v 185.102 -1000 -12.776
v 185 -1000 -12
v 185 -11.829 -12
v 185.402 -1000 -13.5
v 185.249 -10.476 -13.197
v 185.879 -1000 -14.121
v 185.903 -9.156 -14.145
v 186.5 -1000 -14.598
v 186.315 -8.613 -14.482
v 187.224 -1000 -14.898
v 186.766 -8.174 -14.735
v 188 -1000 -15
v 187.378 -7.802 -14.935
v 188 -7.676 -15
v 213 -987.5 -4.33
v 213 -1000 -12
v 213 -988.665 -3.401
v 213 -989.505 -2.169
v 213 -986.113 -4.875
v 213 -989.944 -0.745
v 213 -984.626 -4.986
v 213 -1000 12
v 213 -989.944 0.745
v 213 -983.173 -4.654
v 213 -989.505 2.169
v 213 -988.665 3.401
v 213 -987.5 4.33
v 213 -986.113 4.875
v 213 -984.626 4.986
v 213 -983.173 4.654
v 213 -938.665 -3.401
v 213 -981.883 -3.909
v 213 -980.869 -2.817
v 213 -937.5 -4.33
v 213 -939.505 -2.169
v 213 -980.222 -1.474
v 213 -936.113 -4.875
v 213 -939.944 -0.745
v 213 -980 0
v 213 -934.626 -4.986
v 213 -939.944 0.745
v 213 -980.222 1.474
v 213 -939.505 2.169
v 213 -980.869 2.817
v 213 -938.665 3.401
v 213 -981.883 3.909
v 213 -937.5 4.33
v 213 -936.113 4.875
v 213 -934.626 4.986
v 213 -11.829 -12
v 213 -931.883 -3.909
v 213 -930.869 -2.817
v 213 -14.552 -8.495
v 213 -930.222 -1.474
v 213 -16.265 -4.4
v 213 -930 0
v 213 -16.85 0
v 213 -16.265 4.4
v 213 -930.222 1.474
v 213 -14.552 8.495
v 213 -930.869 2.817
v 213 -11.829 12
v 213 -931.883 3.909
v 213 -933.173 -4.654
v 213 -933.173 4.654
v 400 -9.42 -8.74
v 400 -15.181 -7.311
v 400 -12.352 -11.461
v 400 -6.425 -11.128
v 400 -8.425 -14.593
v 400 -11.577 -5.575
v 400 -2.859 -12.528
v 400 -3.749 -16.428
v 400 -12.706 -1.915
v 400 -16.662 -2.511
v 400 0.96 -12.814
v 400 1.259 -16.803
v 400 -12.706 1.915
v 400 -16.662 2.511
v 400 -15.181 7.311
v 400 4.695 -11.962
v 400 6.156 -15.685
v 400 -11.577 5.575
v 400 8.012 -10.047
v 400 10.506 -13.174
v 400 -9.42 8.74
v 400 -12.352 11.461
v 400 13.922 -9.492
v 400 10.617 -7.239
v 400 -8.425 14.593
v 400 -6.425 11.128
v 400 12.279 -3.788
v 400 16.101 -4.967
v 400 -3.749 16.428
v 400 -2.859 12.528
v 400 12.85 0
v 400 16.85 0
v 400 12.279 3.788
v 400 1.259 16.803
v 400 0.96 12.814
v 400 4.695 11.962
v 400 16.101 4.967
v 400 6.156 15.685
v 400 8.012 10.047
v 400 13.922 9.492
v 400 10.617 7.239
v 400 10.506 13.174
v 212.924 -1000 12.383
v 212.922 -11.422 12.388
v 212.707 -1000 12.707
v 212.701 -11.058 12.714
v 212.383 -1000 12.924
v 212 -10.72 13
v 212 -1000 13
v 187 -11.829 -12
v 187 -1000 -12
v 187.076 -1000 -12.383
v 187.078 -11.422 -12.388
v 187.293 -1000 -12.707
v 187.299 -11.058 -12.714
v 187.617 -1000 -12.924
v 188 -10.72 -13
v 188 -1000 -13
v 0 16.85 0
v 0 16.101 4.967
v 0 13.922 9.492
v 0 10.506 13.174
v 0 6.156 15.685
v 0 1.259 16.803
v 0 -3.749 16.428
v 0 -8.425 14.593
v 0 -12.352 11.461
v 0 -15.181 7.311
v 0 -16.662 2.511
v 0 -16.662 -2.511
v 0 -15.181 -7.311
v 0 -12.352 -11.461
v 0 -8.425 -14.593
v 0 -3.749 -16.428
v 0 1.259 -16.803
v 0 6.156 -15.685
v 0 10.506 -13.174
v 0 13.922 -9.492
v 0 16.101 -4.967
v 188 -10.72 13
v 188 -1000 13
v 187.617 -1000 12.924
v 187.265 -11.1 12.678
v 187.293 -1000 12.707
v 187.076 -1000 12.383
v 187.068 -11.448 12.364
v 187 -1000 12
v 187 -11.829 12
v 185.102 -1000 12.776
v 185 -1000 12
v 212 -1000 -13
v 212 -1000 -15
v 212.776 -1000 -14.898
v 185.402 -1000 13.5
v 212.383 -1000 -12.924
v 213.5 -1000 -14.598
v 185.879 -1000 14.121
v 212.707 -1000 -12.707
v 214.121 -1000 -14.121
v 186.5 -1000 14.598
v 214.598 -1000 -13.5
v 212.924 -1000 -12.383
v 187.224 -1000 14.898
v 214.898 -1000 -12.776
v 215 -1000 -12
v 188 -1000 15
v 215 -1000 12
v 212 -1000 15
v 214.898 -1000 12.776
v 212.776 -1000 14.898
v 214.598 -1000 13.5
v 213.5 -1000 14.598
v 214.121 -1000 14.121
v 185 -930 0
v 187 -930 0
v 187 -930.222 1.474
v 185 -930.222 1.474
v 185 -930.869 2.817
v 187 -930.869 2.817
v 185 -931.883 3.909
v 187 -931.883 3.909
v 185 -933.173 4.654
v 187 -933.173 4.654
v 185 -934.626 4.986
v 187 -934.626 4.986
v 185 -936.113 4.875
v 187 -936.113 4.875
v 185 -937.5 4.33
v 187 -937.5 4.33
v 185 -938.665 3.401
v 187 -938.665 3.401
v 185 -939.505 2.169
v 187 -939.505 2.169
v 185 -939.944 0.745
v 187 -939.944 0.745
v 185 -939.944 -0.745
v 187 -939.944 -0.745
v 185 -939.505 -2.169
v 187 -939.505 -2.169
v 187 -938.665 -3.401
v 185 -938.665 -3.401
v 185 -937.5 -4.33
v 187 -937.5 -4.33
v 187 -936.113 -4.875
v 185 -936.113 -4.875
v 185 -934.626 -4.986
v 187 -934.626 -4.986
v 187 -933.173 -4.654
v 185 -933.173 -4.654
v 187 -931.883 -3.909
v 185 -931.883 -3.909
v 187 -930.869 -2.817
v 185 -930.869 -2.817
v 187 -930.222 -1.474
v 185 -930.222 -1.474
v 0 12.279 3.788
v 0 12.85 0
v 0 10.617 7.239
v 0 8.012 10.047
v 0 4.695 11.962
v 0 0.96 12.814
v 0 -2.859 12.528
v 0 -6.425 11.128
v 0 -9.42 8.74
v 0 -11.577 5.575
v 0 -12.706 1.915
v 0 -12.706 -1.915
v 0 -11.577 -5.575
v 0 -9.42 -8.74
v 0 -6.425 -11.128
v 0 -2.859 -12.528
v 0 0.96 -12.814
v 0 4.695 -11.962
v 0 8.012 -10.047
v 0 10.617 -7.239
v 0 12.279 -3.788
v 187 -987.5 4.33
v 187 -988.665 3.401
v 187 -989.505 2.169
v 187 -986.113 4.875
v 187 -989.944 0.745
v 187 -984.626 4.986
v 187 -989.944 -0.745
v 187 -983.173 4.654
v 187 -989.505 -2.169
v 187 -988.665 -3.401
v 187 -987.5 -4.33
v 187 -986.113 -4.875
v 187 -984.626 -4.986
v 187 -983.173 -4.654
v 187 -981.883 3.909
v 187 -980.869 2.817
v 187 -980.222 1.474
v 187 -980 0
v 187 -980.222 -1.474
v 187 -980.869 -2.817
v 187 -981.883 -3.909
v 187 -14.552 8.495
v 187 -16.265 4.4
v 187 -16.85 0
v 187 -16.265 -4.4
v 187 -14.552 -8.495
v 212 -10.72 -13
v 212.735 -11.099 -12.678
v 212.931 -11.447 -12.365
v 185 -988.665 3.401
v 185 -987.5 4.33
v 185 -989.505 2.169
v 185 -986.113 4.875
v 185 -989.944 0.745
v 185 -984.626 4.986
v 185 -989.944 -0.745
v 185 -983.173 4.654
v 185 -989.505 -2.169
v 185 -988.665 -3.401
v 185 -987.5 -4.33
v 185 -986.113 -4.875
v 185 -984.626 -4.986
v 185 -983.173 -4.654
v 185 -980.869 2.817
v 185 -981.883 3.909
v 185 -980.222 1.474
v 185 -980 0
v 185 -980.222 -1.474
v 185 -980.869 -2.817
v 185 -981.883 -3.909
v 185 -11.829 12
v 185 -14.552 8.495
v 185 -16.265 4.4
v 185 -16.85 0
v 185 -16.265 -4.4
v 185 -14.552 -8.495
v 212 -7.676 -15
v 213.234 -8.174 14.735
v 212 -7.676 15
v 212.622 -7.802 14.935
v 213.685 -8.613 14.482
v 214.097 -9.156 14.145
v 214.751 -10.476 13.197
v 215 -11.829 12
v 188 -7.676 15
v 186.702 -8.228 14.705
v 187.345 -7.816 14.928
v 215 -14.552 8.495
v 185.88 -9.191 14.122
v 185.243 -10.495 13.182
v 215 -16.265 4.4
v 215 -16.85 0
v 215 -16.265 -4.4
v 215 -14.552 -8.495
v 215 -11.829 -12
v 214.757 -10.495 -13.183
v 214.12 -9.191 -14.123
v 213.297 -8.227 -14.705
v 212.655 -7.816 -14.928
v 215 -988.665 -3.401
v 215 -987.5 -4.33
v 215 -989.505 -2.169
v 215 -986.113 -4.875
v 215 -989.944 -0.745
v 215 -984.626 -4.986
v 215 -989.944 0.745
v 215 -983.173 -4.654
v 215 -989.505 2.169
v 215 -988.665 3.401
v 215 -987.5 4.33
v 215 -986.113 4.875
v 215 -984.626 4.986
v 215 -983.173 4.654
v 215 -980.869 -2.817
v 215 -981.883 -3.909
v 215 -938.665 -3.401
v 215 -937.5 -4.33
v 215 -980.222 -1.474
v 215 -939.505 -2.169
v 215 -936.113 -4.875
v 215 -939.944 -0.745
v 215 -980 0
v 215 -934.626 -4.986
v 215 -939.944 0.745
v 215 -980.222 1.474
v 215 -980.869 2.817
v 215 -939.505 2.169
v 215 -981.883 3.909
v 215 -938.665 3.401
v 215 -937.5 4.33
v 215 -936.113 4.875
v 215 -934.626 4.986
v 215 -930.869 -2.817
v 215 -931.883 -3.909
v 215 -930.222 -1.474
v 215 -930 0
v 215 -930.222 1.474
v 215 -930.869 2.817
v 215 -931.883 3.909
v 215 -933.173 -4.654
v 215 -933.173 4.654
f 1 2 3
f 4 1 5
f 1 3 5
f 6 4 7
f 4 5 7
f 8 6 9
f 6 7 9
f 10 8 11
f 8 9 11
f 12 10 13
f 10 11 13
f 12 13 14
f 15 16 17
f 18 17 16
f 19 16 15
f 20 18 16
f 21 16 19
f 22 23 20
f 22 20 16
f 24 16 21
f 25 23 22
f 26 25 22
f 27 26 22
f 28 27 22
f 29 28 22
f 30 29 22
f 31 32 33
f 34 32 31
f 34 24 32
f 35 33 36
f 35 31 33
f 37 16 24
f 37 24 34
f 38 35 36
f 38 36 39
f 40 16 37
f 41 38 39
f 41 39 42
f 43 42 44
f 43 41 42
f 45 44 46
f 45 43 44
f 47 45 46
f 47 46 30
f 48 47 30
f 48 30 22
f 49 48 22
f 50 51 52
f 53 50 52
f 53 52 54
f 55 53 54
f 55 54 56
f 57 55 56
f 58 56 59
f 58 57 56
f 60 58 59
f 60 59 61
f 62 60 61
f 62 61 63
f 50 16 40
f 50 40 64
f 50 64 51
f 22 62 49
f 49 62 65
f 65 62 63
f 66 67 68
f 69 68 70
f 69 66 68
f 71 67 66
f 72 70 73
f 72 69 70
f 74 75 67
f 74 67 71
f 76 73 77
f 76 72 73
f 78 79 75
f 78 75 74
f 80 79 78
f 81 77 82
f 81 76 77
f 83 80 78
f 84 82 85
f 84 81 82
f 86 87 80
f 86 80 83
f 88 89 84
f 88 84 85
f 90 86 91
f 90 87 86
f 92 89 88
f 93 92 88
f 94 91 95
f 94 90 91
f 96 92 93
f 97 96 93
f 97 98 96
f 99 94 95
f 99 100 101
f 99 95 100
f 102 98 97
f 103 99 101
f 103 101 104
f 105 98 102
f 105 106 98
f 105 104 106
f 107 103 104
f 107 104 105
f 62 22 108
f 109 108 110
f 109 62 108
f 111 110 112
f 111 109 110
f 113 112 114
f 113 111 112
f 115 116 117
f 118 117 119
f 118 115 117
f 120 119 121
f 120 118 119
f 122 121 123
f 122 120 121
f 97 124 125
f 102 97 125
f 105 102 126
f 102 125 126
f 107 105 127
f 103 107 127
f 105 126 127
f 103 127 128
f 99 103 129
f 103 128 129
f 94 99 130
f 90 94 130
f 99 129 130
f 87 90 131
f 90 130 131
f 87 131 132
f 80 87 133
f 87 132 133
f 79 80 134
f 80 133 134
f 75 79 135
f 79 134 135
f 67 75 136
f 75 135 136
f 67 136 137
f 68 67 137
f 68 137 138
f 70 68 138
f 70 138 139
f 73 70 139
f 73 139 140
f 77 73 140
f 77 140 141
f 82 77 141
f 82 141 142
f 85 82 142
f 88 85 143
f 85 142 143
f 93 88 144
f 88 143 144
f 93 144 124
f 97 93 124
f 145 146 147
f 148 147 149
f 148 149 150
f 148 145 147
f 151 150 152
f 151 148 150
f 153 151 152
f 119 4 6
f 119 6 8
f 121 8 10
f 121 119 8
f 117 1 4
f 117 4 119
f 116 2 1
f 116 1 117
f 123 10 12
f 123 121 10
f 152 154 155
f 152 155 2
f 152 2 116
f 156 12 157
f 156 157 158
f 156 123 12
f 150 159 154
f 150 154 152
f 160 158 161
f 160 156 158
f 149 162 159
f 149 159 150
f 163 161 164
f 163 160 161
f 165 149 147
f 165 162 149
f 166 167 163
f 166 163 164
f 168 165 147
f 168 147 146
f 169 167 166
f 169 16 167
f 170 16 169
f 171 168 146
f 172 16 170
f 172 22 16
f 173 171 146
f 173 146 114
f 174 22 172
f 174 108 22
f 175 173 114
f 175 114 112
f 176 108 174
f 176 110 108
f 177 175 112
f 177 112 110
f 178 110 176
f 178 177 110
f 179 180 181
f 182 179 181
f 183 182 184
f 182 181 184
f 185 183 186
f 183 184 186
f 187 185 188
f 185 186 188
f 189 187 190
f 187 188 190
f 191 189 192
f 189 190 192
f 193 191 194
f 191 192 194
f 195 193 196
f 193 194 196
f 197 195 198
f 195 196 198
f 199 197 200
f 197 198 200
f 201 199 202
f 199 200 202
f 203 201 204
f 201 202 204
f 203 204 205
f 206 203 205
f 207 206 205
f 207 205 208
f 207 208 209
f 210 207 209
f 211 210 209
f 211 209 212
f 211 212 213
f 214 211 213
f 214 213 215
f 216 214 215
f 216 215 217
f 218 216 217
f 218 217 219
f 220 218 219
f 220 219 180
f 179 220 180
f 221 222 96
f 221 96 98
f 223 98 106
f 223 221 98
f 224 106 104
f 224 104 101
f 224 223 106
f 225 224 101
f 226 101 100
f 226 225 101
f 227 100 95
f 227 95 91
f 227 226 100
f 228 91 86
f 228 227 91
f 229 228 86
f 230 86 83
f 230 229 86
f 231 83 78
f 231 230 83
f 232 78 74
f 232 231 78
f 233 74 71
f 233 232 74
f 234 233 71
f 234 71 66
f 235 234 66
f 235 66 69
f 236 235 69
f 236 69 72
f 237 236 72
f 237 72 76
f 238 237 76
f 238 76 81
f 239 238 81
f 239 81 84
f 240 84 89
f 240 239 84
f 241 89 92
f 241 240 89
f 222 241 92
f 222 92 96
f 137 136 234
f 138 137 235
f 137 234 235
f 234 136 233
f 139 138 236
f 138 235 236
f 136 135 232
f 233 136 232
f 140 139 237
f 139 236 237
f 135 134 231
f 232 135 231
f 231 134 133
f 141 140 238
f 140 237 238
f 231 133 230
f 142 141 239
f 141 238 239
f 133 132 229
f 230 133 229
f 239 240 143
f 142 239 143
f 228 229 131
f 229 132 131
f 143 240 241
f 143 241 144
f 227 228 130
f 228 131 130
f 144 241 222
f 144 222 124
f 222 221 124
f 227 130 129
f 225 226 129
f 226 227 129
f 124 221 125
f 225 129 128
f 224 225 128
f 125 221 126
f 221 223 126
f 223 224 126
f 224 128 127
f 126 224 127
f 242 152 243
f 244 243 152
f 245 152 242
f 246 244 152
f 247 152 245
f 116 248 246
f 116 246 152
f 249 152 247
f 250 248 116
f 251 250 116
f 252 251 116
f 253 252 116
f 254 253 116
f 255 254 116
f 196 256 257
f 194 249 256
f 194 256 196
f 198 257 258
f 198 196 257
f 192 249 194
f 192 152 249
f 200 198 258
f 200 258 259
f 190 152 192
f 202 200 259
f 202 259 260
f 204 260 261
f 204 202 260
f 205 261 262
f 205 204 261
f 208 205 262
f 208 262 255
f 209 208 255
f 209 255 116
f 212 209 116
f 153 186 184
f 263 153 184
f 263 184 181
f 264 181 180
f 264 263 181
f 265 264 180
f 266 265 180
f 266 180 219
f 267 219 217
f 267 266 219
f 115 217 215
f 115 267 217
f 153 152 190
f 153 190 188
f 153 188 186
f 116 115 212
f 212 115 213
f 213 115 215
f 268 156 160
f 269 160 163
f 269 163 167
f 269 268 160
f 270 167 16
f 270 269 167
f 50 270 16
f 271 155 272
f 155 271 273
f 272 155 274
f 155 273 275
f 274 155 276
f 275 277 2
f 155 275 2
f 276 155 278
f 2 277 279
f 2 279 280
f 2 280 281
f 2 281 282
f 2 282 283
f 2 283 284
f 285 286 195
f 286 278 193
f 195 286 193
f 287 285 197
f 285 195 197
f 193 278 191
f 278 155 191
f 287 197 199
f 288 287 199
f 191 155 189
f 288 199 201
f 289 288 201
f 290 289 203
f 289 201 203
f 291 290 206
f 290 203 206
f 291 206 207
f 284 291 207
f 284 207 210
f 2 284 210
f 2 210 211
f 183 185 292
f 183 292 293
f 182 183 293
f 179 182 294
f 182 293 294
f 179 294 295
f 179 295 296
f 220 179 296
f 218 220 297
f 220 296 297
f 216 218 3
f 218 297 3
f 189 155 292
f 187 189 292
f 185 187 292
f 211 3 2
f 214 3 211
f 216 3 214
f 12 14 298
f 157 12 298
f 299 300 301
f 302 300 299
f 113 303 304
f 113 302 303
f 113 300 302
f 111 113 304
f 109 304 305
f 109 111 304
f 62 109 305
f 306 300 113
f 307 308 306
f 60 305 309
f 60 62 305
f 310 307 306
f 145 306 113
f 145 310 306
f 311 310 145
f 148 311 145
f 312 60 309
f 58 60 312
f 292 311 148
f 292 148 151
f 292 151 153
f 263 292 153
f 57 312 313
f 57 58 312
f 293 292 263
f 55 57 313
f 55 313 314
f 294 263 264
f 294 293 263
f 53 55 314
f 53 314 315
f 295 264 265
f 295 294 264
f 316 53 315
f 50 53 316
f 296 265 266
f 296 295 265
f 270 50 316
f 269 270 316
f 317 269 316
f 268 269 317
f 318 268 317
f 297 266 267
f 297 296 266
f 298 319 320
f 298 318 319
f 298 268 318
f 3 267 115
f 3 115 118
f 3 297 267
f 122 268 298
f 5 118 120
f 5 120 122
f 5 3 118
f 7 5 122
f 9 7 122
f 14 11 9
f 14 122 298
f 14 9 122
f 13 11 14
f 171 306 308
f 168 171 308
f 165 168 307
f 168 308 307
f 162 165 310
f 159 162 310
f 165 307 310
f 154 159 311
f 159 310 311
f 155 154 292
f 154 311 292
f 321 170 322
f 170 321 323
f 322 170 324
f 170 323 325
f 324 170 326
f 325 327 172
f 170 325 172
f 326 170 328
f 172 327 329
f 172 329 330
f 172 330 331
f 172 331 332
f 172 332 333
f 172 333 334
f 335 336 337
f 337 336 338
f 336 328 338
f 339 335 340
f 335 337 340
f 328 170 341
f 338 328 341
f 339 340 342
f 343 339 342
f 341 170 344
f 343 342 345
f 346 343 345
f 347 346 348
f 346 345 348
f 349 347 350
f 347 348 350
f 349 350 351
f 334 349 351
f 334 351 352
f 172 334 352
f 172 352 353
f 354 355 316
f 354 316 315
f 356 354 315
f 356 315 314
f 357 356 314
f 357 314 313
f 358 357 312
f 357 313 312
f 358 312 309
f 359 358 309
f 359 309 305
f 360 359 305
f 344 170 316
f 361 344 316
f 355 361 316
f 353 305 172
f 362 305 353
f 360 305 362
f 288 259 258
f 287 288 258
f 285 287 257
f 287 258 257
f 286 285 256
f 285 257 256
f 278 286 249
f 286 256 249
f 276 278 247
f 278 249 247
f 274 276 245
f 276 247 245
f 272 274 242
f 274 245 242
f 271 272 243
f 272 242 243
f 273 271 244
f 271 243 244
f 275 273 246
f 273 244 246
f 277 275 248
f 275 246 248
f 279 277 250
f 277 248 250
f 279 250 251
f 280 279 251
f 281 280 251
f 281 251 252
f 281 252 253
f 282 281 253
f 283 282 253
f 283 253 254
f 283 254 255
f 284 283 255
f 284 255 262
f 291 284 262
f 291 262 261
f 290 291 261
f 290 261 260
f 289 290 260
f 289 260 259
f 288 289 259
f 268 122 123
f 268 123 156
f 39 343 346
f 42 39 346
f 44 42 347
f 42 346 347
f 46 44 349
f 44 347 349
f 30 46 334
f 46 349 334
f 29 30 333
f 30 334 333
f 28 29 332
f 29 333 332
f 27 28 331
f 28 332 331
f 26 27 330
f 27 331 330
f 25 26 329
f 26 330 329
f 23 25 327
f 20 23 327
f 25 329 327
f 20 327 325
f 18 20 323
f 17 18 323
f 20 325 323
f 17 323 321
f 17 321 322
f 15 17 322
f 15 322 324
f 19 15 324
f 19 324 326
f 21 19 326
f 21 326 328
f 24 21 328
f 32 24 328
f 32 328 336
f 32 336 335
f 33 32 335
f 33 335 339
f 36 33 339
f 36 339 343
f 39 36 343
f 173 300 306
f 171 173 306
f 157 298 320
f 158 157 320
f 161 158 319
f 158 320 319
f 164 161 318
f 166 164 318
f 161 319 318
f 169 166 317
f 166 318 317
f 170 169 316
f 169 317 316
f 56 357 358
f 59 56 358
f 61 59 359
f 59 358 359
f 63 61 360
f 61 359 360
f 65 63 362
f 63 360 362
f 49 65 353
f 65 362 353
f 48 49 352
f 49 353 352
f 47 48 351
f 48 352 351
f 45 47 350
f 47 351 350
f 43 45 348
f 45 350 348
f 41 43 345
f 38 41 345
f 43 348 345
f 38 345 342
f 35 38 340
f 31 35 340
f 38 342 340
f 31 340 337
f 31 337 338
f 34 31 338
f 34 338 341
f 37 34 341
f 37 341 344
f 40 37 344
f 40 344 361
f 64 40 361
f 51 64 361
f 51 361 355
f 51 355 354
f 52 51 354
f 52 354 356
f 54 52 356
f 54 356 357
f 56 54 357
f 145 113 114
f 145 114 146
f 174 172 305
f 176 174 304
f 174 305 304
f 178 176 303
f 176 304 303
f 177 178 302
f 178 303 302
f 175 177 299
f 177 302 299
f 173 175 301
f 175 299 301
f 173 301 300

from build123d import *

# Parameters (mm, degrees)
SQUARE_TUBE_CONFIGURED_40_X_40_X_4_1_DEPTH = 1000
SKETCH11_R                                 = 16.85
SKETCH11_R_2                               = 12.85
PIPE_CONFIGURED_33_7_X_4_0_2_DEPTH         = 400
ESBO_O5_R                                  = 5
CORTE_EXTRUS_O1_DEPTH                      = 1023.990187001


with BuildPart() as part:
    # Sketch12 → Square tube - configured 40 X 40 X 4(1) (new body)
    with BuildSketch(Plane(origin=(200, 0, 0), x_dir=(1, 0, 0), z_dir=(0, -1, 0))):
        with BuildLine():
            Line((-12, -15), (12, -15))
            ThreePointArc((12, -15), (14.121320344, -14.121320344), (15, -12))
            Line((15, -12), (15, 12))
            ThreePointArc((15, 12), (14.121320344, 14.121320344), (12, 15))
            Line((12, 15), (-12, 15))
            ThreePointArc((-12, 15), (-14.121320344, 14.121320344), (-15, 12))
            Line((-15, 12), (-15, -12))
            ThreePointArc((-15, -12), (-14.121320344, -14.121320344), (-12, -15))
        make_face()
        with BuildLine():
            Line((-12, -13), (12, -13))
            ThreePointArc((12, -13), (12.707106781, -12.707106781), (13, -12))
            Line((13, -12), (13, 12))
            ThreePointArc((13, 12), (12.707106781, 12.707106781), (12, 13))
            Line((12, 13), (-12, 13))
            ThreePointArc((-12, 13), (-12.707106781, 12.707106781), (-13, 12))
            Line((-13, 12), (-13, -12))
            ThreePointArc((-13, -12), (-12.707106781, -12.707106781), (-12, -13))
        make_face(mode=Mode.SUBTRACT)
    extrude(amount=SQUARE_TUBE_CONFIGURED_40_X_40_X_4_1_DEPTH)


with BuildPart() as body_2:
    # Sketch11 → Pipe - configured 33.7 X 4.0(2) (new body)
    with BuildSketch(Plane.YZ):
        Circle(SKETCH11_R)
        Circle(SKETCH11_R_2, mode=Mode.SUBTRACT)
    extrude(amount=PIPE_CONFIGURED_33_7_X_4_0_2_DEPTH)


with BuildPart() as part_1:
    add(part.part)

    # Aparar/Estender1: cut back where it meets the other member's skin (coped)
    split(bisect_by=body_2.part.faces().sort_by_distance((200, -16.85, 0))[0], keep=Keep.TOP)

    # Esboço5 → Corte-extrusão1 (cut, through all)
    with BuildSketch(Plane(origin=(215, 0, 0), x_dir=(0, 0, -1), z_dir=(1, 0, 0))):
        with Locations(Location((0, -985, 0), (0, 0, 90))):
            Circle(ESBO_O5_R)
        with Locations(Location((0, -935, 0), (0, 0, 90))):
            Circle(ESBO_O5_R)
    extrude(amount=-CORTE_EXTRUS_O1_DEPTH, mode=Mode.SUBTRACT)


solid = Compound([body_2.part, part_1.part])
